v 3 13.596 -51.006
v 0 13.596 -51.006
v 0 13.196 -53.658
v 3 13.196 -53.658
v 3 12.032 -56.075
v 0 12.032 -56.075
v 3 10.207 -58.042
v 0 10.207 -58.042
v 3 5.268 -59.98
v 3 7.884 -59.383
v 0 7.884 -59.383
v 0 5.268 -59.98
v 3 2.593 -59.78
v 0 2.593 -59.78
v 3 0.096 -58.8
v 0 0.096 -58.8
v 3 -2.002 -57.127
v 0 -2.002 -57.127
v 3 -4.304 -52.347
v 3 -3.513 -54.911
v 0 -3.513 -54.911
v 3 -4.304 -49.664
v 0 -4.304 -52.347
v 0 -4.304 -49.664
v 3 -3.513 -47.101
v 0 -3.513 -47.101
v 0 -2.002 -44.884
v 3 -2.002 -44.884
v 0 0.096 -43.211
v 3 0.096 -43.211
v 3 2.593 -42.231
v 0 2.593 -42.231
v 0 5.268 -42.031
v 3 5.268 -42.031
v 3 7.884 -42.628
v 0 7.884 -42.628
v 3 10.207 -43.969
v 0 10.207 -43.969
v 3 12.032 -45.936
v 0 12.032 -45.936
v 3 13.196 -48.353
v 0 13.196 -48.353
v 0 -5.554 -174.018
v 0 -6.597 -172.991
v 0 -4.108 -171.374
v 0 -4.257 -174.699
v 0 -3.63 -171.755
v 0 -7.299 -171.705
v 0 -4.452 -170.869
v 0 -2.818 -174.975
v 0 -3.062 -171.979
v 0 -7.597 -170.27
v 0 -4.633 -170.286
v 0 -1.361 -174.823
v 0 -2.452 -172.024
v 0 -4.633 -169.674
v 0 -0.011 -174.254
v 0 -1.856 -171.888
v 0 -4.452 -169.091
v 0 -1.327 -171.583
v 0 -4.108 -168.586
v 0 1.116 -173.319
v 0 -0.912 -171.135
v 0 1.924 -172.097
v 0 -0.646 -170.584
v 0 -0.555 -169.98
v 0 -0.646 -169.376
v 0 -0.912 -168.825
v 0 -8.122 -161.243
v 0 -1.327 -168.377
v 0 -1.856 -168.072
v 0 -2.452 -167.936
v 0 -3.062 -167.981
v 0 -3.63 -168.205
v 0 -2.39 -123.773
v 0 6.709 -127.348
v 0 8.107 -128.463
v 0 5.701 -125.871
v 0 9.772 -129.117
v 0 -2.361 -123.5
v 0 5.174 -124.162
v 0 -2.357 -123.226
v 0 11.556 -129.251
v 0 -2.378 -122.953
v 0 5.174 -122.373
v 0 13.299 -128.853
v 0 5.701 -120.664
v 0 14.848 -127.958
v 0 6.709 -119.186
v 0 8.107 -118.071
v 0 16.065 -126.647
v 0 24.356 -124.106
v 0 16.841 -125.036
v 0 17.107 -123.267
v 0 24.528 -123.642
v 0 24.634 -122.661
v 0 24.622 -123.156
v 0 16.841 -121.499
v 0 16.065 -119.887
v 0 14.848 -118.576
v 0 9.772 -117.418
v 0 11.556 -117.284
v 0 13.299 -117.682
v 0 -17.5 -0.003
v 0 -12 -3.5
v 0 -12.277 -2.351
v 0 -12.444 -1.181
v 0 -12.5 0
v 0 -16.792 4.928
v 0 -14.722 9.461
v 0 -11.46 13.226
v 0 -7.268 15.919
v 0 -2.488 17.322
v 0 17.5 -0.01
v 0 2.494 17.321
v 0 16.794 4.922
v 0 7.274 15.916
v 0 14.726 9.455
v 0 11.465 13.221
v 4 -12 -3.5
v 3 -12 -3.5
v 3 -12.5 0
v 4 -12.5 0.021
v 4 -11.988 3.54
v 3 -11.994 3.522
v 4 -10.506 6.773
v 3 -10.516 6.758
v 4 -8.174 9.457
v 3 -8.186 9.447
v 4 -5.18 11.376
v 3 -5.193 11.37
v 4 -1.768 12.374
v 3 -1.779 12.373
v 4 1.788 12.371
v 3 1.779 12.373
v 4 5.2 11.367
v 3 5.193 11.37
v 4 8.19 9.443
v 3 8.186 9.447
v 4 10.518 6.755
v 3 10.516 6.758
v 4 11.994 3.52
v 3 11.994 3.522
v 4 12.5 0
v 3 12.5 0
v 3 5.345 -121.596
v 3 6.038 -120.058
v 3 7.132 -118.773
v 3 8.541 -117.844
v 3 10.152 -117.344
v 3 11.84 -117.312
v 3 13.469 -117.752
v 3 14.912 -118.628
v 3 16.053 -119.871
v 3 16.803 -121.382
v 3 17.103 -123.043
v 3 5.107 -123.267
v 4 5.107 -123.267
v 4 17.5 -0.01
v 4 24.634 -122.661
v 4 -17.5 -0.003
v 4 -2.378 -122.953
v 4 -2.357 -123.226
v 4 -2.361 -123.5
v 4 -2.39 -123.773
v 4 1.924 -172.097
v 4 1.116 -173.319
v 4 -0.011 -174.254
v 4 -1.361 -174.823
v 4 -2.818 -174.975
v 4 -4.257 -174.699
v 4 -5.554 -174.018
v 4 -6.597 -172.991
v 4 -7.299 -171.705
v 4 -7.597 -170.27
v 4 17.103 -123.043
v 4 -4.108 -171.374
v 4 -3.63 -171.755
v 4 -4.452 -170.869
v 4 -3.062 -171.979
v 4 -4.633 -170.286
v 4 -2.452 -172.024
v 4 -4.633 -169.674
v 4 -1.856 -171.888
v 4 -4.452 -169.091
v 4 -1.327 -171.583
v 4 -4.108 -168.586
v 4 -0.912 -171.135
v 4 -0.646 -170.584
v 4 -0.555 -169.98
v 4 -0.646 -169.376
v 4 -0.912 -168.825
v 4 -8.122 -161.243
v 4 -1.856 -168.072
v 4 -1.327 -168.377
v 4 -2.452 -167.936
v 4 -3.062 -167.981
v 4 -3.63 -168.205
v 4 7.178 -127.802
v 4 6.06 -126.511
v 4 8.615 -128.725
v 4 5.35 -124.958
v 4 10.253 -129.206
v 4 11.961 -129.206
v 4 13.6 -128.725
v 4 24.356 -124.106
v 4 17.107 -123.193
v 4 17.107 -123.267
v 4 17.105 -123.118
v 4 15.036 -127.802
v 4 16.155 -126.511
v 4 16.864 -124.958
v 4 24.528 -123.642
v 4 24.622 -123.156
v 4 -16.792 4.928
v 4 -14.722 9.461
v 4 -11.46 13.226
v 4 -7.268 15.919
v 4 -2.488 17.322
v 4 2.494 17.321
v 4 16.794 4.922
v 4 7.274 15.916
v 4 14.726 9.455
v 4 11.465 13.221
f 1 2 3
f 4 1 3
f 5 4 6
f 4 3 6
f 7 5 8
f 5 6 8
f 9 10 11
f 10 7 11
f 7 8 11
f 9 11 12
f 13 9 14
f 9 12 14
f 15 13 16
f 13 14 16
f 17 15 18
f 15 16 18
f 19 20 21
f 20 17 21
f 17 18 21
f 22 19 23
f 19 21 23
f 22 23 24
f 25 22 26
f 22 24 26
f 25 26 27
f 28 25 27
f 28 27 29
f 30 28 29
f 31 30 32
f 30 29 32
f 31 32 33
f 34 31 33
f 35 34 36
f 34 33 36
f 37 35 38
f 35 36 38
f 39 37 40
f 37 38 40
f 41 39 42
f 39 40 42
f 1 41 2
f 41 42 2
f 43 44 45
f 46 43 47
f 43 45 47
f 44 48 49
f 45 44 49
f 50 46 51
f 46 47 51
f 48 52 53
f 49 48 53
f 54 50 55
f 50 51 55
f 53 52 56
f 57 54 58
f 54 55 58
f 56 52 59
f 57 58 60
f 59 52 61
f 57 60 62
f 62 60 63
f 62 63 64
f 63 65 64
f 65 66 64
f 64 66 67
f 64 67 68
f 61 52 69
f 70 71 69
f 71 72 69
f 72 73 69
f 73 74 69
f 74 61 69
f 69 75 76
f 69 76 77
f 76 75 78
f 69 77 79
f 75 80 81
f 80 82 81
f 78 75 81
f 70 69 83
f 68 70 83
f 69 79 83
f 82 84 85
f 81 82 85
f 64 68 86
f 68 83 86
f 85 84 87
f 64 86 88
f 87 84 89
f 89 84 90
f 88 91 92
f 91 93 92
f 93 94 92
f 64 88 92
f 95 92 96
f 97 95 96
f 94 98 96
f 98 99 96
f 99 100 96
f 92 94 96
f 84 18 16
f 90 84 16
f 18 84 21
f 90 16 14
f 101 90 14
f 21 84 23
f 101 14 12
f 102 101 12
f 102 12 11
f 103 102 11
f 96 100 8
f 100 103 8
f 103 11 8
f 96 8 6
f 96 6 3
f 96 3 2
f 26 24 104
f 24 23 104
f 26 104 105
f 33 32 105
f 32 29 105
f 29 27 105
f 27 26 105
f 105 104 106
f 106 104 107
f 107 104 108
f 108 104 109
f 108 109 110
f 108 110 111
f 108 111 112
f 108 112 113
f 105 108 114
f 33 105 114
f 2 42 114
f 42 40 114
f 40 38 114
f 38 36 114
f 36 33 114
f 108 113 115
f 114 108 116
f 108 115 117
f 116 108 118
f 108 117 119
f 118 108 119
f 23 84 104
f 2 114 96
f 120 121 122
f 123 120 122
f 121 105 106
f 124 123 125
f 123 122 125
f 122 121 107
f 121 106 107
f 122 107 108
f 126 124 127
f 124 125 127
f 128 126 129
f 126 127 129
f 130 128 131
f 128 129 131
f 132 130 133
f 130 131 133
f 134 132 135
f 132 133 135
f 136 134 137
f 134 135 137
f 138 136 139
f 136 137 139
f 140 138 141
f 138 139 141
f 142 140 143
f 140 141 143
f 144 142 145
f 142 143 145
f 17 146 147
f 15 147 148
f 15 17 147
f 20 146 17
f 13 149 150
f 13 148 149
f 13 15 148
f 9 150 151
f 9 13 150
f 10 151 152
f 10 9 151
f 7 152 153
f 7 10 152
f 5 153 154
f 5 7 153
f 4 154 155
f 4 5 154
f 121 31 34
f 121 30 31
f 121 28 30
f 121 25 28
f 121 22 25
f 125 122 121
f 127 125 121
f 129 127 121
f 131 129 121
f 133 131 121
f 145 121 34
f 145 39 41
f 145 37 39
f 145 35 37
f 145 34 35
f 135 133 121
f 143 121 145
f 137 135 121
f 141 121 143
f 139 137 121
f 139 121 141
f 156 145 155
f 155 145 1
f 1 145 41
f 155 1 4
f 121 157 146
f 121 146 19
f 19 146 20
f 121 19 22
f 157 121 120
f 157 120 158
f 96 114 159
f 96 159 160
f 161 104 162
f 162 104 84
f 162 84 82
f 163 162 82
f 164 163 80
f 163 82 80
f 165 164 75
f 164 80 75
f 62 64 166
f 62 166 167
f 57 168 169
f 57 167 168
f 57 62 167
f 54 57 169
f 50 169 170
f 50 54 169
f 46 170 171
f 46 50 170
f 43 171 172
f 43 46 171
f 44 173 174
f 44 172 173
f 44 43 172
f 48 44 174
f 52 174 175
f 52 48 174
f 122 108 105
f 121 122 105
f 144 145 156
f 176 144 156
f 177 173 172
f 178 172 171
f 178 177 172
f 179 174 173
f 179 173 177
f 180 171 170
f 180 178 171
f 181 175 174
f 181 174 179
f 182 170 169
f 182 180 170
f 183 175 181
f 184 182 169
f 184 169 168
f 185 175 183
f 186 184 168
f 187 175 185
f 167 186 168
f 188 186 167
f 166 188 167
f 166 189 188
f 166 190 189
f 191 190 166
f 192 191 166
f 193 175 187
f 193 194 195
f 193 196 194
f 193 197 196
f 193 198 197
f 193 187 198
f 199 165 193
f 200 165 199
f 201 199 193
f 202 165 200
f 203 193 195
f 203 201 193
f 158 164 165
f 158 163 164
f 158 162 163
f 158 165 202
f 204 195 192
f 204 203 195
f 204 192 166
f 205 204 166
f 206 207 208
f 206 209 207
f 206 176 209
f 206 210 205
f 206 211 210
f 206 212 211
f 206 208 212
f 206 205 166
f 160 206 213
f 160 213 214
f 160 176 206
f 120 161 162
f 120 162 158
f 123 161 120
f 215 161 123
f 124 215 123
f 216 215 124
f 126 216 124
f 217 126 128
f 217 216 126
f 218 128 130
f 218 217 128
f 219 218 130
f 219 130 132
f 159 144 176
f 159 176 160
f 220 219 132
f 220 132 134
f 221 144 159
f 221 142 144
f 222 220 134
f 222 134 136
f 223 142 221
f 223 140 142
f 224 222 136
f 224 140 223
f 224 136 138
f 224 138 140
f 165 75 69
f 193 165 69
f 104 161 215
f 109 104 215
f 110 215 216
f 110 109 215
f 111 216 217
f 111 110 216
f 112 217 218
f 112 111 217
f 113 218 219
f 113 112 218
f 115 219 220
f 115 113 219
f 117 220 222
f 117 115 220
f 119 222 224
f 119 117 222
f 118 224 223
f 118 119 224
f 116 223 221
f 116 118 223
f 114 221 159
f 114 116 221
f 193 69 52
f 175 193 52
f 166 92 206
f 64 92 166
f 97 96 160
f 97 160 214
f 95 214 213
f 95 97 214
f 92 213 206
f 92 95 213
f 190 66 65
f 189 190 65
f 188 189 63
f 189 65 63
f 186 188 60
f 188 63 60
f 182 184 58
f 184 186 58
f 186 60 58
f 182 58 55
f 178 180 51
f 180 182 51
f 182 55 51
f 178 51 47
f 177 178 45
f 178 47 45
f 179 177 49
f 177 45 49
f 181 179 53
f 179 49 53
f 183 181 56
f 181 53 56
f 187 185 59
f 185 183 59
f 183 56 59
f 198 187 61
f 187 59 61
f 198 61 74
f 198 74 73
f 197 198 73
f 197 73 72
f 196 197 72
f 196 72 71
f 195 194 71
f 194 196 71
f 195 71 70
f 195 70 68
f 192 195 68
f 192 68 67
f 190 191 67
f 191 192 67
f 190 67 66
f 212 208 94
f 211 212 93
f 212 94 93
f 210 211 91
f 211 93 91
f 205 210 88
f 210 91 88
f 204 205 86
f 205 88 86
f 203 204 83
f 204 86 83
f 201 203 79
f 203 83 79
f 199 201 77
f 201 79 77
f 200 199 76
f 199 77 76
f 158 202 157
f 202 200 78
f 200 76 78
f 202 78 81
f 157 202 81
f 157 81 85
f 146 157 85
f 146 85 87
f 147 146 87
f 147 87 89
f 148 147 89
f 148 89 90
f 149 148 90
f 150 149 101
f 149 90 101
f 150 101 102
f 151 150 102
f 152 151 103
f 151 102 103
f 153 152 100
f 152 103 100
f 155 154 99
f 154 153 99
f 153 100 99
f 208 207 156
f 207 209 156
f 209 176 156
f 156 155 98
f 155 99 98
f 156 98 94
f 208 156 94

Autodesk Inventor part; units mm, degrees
ref_plane "YZ Plane" through (0, 0, 0) normal (1, 0, 0) x (0, 1, 0)
ref_plane "XZ Plane" through (0, 0, 0) normal (0, 1, 0) x (-1, 0, 0)
ref_plane "XY Plane" through (0, 0, 0) normal (0, 0, 1) x (1, 0, 0)
sketch "Sketch1" plane through (0, 0, 0) normal (1, 0, 0) x (0, 1, 0)
  circle A0 centre (-2.6054, -169.98) radius 2.05
  arc A1 (17.5, -0.0099) -> (-16.9792, -4.2375) centre (0, 0) ccw
  arc A2 (-7.5969, -170.2704) -> (1.9242, -172.0973) centre (-2.6054, -169.98) ccw
  line L0 (17.5, -0.0099) -> (47.8897, -0.0099) construction
  line L1 (17.5, -0.0099) -> (24.6336, -122.6611)
  line L2 (24.3565, -124.1056) -> (1.9242, -172.0973)
  line L3 (-17.5, -0.0032) -> (-2.3777, -122.9531)
  line L4 (-2.3898, -123.7729) -> (-8.122, -161.2434)
  line L5 (-17.5, -0.0032) -> (-17.3824, -2.0256)
  line L6 (-8.122, -161.2434) -> (-7.5969, -170.2704)
  arc A3 (24.3565, -124.1056) -> (24.6336, -122.6611) centre (21.6387, -122.8353) ccw
  arc A4 (-2.3898, -123.7729) -> (-2.3777, -122.9531) centre (-5.3553, -123.3193) ccw
  circle A5 centre (4.5959, -51.0056) radius 9
  circle A6 centre (11.1072, -123.2673) radius 6
  circle A7 centre (0, 0) radius 12.5
  line L7 (12.5, 0) -> (17.103, -123.043)
  line L8 (-12.5, 0) -> (5.1072, -123.2673)
  point P0 (-2.3556, -123.3634)
  point P1 (24.5849, -123.4006)
  point P2 (-12.0001, -3.4995)
  dimension "d8" = 10
  dimension "d9" = 35
  dimension "d10" = 4.1
  dimension "d11" = 170
  dimension "d12" = 3
  dimension "d13" = 3
  dimension "d16" = 18
  dimension "d17" = 12
  dimension "d19" = 25
extrude "Extrusion1" add sketch "Sketch1" along normal blind 4 contours L1 A3 L2 A2 L6 L4 A4 L3 A1
extrude "Extrusion2" add sketch "Sketch1" along normal blind 3 contours A6 L8 A7 L7
extrude "Extrusion3" add sketch "Sketch1" along normal blind 3 contours A7 L8 picked at (2.216, 2.7519)
equation "\"BendRadius\" = Thickness"
equation "\"BendReliefWidth\" = Thickness"
equation "\"BendReliefDepth\" = 0.5 * Thickness"
equation "\"CornerReliefSize\" = 4 * Thickness"
equation "\"MinimumRemnant\" = 2 * Thickness"
equation "\"TransitionRadius\" = BendRadius"
equation "\"JacobiRadiusSize\" = BendRadius"
equation "\"GapSize\" = Thickness"
equation "\"Thickness\" = 0.5"
properties part number "LINK1"
